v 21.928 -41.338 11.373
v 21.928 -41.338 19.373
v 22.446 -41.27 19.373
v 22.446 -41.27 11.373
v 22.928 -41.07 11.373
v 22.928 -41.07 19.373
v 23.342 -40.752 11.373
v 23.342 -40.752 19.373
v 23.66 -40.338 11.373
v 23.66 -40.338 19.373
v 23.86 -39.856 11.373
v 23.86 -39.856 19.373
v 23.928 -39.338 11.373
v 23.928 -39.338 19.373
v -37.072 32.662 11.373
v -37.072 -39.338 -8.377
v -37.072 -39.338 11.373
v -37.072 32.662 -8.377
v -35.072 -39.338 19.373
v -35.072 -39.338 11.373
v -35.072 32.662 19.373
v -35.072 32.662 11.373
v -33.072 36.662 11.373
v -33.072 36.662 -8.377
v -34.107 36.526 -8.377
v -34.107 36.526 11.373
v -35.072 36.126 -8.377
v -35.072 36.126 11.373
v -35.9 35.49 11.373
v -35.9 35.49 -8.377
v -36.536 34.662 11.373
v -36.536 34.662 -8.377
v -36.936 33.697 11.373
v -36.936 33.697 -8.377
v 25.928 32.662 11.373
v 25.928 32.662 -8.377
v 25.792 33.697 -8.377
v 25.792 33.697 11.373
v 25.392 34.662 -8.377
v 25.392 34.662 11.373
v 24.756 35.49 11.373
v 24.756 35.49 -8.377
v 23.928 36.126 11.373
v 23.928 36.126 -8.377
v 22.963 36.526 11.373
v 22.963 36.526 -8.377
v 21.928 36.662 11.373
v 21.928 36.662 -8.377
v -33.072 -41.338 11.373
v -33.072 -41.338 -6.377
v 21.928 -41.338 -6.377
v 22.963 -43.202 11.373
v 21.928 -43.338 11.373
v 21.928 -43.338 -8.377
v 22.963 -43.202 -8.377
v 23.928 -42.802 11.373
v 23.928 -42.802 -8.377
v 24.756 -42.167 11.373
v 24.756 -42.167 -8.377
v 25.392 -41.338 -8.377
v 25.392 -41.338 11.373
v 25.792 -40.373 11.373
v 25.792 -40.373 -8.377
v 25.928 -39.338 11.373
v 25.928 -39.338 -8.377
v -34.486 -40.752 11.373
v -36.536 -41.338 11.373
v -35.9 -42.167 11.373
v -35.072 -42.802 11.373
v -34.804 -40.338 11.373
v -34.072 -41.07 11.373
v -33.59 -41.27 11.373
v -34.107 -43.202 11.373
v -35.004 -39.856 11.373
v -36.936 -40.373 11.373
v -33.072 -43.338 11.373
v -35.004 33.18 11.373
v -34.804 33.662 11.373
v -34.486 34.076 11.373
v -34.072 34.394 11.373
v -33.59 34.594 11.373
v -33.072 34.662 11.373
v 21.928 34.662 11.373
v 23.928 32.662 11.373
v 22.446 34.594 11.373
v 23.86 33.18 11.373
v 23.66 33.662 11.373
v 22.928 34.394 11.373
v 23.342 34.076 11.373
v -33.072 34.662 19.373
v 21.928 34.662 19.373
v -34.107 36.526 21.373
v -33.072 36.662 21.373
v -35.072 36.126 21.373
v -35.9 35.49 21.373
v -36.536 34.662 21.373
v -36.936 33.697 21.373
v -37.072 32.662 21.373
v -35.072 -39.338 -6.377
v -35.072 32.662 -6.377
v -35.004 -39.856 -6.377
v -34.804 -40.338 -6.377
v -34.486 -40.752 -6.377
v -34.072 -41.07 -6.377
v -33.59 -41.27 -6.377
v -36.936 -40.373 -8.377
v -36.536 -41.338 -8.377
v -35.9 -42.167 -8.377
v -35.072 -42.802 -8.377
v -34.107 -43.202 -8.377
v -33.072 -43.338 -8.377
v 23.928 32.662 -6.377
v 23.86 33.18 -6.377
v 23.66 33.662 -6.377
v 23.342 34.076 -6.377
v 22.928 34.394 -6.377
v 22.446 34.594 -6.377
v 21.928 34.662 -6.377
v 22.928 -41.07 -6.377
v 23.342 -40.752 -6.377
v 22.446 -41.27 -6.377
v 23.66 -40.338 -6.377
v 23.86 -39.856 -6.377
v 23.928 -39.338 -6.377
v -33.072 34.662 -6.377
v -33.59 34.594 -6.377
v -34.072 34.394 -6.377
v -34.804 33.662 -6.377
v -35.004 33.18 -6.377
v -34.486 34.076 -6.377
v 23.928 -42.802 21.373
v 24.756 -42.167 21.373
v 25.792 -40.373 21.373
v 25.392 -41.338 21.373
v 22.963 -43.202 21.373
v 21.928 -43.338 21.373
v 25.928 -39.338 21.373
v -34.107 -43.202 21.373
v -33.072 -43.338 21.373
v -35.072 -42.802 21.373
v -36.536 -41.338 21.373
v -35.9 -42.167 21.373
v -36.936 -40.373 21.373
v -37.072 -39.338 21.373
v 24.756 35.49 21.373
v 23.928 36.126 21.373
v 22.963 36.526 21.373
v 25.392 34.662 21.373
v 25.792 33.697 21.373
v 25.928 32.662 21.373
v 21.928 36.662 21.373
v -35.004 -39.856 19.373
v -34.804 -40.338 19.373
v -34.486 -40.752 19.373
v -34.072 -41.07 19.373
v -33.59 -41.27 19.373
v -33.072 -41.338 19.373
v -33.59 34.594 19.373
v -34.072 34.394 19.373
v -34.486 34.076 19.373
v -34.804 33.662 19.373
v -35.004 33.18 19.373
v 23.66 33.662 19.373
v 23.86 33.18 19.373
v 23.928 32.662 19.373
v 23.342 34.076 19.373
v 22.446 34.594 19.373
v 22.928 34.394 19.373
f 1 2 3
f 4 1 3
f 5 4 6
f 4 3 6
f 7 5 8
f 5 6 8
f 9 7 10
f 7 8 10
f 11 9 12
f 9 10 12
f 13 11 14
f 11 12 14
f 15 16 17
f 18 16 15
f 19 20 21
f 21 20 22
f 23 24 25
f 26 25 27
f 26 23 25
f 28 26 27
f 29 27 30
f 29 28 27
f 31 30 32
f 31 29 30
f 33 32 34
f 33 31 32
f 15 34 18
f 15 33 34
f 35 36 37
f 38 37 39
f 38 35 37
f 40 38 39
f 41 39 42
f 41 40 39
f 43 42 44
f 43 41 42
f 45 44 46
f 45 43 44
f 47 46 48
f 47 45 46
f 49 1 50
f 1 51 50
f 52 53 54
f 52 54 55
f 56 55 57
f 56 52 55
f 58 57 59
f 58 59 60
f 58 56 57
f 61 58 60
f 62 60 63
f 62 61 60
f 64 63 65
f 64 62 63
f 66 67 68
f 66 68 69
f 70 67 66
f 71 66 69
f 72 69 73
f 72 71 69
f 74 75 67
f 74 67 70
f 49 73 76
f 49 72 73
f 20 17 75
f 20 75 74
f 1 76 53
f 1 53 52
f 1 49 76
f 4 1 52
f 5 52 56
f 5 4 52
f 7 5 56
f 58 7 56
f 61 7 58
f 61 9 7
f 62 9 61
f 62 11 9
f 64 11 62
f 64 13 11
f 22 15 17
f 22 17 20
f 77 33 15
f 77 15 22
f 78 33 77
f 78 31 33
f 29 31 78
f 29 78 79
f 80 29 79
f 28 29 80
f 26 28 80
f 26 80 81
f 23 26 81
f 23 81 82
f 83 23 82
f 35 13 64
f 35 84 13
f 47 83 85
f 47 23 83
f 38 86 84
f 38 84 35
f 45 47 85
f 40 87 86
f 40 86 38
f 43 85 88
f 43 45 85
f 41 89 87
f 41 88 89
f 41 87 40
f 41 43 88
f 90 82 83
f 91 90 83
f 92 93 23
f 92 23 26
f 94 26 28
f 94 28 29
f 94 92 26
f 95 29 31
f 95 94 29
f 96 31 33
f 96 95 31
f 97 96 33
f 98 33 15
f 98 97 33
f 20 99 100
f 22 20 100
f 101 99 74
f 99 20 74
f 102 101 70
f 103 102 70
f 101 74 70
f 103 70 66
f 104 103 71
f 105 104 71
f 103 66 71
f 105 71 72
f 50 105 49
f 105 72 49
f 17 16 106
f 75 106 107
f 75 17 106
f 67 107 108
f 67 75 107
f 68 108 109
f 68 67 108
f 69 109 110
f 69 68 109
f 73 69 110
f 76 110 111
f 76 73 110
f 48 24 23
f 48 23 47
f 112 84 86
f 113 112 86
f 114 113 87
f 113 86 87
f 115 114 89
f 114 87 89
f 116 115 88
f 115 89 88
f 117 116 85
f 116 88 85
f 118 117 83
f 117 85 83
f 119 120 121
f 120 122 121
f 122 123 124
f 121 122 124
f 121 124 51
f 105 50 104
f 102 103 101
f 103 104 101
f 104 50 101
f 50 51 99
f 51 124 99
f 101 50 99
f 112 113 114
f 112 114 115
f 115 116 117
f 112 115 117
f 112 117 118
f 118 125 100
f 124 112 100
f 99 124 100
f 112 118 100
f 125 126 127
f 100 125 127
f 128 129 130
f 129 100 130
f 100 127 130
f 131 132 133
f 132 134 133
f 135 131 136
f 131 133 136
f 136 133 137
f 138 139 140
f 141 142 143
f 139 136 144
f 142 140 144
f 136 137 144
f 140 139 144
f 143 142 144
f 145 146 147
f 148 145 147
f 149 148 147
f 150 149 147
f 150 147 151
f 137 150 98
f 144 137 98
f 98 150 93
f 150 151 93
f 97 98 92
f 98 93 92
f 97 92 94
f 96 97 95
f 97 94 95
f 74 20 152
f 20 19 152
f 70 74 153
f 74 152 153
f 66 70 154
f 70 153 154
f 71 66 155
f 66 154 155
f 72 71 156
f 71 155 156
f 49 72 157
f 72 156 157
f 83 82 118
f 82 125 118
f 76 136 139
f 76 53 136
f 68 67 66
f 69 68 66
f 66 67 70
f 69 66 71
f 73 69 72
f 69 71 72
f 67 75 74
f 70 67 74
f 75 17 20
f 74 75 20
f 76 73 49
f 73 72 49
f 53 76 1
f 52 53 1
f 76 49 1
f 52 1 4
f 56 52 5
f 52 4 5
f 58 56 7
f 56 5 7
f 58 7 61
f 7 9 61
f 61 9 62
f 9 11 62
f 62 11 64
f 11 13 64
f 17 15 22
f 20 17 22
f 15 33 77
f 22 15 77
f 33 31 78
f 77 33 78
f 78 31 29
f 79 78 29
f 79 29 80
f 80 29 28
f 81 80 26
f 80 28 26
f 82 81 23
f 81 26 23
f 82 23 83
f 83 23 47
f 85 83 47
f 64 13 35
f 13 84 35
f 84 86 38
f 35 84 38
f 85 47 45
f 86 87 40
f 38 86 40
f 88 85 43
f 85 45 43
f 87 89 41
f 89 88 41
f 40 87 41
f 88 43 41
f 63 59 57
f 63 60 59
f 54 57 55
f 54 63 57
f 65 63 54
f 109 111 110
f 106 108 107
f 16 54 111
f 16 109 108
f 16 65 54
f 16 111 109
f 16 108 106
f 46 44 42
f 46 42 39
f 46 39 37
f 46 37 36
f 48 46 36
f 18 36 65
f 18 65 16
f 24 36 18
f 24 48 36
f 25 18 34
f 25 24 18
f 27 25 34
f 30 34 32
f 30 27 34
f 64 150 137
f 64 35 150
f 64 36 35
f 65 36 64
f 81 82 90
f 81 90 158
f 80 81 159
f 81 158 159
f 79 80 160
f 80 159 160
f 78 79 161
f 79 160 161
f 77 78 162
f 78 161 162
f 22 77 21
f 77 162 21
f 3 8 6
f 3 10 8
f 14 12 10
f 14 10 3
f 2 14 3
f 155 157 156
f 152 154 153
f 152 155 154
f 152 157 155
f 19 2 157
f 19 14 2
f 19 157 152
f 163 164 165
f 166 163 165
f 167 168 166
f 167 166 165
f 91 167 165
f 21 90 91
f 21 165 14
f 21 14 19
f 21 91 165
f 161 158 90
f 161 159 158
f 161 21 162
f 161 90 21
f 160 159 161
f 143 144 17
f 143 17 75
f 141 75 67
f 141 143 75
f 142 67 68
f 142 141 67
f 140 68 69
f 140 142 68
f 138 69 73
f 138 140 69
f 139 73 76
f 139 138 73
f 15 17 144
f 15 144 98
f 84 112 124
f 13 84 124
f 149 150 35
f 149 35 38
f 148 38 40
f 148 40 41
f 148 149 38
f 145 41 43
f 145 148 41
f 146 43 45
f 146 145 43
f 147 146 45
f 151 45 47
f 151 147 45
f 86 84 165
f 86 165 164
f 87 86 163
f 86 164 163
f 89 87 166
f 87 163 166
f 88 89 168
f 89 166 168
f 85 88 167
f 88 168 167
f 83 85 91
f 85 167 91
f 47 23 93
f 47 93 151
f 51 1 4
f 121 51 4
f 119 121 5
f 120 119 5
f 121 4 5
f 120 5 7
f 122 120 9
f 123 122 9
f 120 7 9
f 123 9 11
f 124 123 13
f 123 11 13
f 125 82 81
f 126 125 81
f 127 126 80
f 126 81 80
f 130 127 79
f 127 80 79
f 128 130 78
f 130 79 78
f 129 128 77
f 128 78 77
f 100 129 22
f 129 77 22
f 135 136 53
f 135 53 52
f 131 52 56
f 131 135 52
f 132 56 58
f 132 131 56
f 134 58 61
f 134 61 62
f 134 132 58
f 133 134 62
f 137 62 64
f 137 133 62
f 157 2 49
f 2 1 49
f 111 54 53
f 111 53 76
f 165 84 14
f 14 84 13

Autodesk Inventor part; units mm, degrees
ref_plane "YZ Plane" through (0, 0, 0) normal (1, 0, 0) x (0, 1, 0)
ref_plane "XZ Plane" through (0, 0, 0) normal (0, 1, 0) x (-1, 0, 0)
ref_plane "Work Plane3" through (-33.721, -16.0631, -8.3772) normal (0, 0, -1) x (-1, 0, 0)
sketch "Sketch2" plane through (-33.721, -16.0631, -8.3772) normal (0, 0, -1) x (-1, 0, 0)
  line L0 (3.351, 52.725) -> (-59.649, 52.725)
  line L1 (-59.649, 52.725) -> (-59.649, -27.275)
  line L2 (-59.649, -27.275) -> (3.351, -27.275)
  line L3 (3.351, -27.275) -> (3.351, 52.725)
  line L4 (3.351, 52.725) -> (-59.649, -27.275) construction
  line L5 (-59.649, 52.725) -> (3.351, -27.275) construction
  line L6 (-25.524, -24.775) -> (-3.524, -24.775)
  line L7 (-0.024, 32.975) -> (-0.024, 14.6)
  line L8 (-56.274, -10.275) -> (-56.274, 32.975)
  line L9 (-3.524, 50.225) -> (-25.524, 50.225)
  line L10 (-1.524, 34.475) -> (-56.274, 34.475)
  line L11 (-56.274, -11.775) -> (-56.274, 34.475)
  line L12 (-56.274, -11.775) -> (-1.524, -11.775)
  line L13 (-1.524, -11.775) -> (-1.1358, -11.7239)
  line L14 (-0.774, -11.574) -> (-1.1358, -11.7239)
  line L15 (-0.4633, -11.3357) -> (-0.774, -11.574)
  line L16 (-0.4633, -11.3357) -> (-0.225, -11.025)
  line L17 (-0.0751, -10.6632) -> (-0.225, -11.025)
  line L18 (-0.024, -10.275) -> (-0.0751, -10.6632)
  line L19 (-0.024, 0) -> (-0.024, -10.275)
  line L20 (-0.024, 0) -> (-14.65, 0)
  line L21 (-14.65, 14.6) -> (-14.65, 0)
  line L22 (-0.024, 14.6) -> (-14.65, 14.6)
  line L23 (-0.024, 32.975) -> (-0.024, 14.6)
  line L24 (-0.024, 32.975) -> (-0.0751, 33.3632)
  line L25 (-0.0751, 33.3632) -> (-0.225, 33.725)
  line L26 (-0.225, 33.725) -> (-0.4633, 34.0357)
  line L27 (-0.774, 34.274) -> (-0.4633, 34.0357)
  line L28 (-1.1358, 34.4239) -> (-0.774, 34.274)
  line L29 (-1.1358, 34.4239) -> (-1.524, 34.475)
  line L30 (-46.714, -1.95) -> (-47.364, -1.95)
  line L31 (-46.714, -1.95) -> (-46.714, -2.6)
  line L32 (-47.364, -2.6) -> (-46.714, -2.6)
  line L33 (-47.364, -2.6) -> (-47.364, -1.95)
  line L34 (-37.794, -7.64) -> (-38.444, -7.64)
  line L35 (-37.794, -8.29) -> (-37.794, -7.64)
  line L36 (-38.444, -8.29) -> (-37.794, -8.29)
  line L37 (-38.444, -8.29) -> (-38.444, -7.64)
  line L38 (-2.8885, -10.3772) -> (-3.149, -10.4)
  line L39 (-3.4095, -10.3772) -> (-3.149, -10.4)
  line L40 (-3.662, -10.3095) -> (-3.4095, -10.3772)
  line L41 (-3.899, -10.199) -> (-3.662, -10.3095)
  line L42 (-3.899, -10.199) -> (-4.1132, -10.0491)
  line L43 (-4.1132, -10.0491) -> (-4.2981, -9.8642)
  line L44 (-4.2981, -9.8642) -> (-4.448, -9.65)
  line L45 (-4.5585, -9.413) -> (-4.448, -9.65)
  line L46 (-4.5585, -9.413) -> (-4.6262, -9.1605)
  line L47 (-4.6262, -9.1605) -> (-4.649, -8.9)
  line L48 (-4.649, -8.9) -> (-4.6262, -8.6395)
  line L49 (-4.5585, -8.387) -> (-4.6262, -8.6395)
  line L50 (-4.5585, -8.387) -> (-4.448, -8.15)
  line L51 (-4.448, -8.15) -> (-4.2981, -7.9358)
  line L52 (-4.2981, -7.9358) -> (-4.1132, -7.7509)
  line L53 (-3.899, -7.601) -> (-4.1132, -7.7509)
  line L54 (-3.662, -7.4905) -> (-3.899, -7.601)
  line L55 (-3.662, -7.4905) -> (-3.4095, -7.4228)
  line L56 (-3.4095, -7.4228) -> (-3.149, -7.4)
  line L57 (-2.8885, -7.4228) -> (-3.149, -7.4)
  line L58 (-2.636, -7.4905) -> (-2.8885, -7.4228)
  line L59 (-2.399, -7.601) -> (-2.636, -7.4905)
  line L60 (-2.399, -7.601) -> (-2.1848, -7.7509)
  line L61 (-1.9999, -7.9358) -> (-2.1848, -7.7509)
  line L62 (-1.85, -8.15) -> (-1.9999, -7.9358)
  line L63 (-1.85, -8.15) -> (-1.7395, -8.387)
  line L64 (-1.7395, -8.387) -> (-1.6718, -8.6395)
  line L65 (-1.6718, -8.6395) -> (-1.649, -8.9)
  line L66 (-1.649, -8.9) -> (-1.6718, -9.1605)
  line L67 (-1.7395, -9.413) -> (-1.6718, -9.1605)
  line L68 (-1.7395, -9.413) -> (-1.85, -9.65)
  line L69 (-1.9999, -9.8642) -> (-1.85, -9.65)
  line L70 (-1.9999, -9.8642) -> (-2.1848, -10.0491)
  line L71 (-2.399, -10.199) -> (-2.1848, -10.0491)
  line L72 (-2.636, -10.3095) -> (-2.399, -10.199)
  line L73 (-2.636, -10.3095) -> (-2.8885, -10.3772)
  line L74 (-7.964, -8.29) -> (-7.314, -8.29)
  line L75 (-7.964, -8.29) -> (-7.964, -7.64)
  line L76 (-7.964, -7.64) -> (-7.314, -7.64)
  line L77 (-7.314, -7.64) -> (-7.314, -8.29)
  line L78 (-10.504, -10.83) -> (-9.854, -10.83)
  line L79 (-10.504, -10.18) -> (-10.504, -10.83)
  line L80 (-10.504, -10.18) -> (-9.854, -10.18)
  line L81 (-9.854, -10.18) -> (-9.854, -10.83)
  line L82 (-15.584, -10.83) -> (-14.934, -10.83)
  line L83 (-15.584, -10.18) -> (-15.584, -10.83)
  line L84 (-14.934, -10.18) -> (-15.584, -10.18)
  line L85 (-14.934, -10.18) -> (-14.934, -10.83)
  line L86 (-15.584, -8.29) -> (-14.934, -8.29)
  line L87 (-15.584, -7.64) -> (-15.584, -8.29)
  line L88 (-15.584, -7.64) -> (-14.934, -7.64)
  line L89 (-14.934, -7.64) -> (-14.934, -8.29)
  line L90 (-17.474, -7.64) -> (-17.474, -8.29)
  line L91 (-18.124, -8.29) -> (-17.474, -8.29)
  line L92 (-18.124, -7.64) -> (-18.124, -8.29)
  line L93 (-17.474, -7.64) -> (-18.124, -7.64)
  line L94 (-20.014, -7.64) -> (-20.014, -8.29)
  line L95 (-20.664, -8.29) -> (-20.014, -8.29)
  line L96 (-20.664, -7.64) -> (-20.664, -8.29)
  line L97 (-20.014, -7.64) -> (-20.664, -7.64)
  line L98 (-22.554, -7.64) -> (-22.554, -8.29)
  line L99 (-23.204, -8.29) -> (-22.554, -8.29)
  line L100 (-23.204, -7.64) -> (-23.204, -8.29)
  line L101 (-22.554, -7.64) -> (-23.204, -7.64)
  line L102 (-25.094, -7.64) -> (-25.094, -8.29)
  line L103 (-25.744, -8.29) -> (-25.094, -8.29)
  line L104 (-25.744, -7.64) -> (-25.744, -8.29)
  line L105 (-25.094, -7.64) -> (-25.744, -7.64)
  line L106 (-27.634, -7.64) -> (-27.634, -8.29)
  line L107 (-28.284, -8.29) -> (-27.634, -8.29)
  line L108 (-28.284, -8.29) -> (-28.284, -7.64)
  line L109 (-27.634, -7.64) -> (-28.284, -7.64)
  line L110 (-30.824, -10.83) -> (-30.174, -10.83)
  line L111 (-30.824, -10.18) -> (-30.824, -10.83)
  line L112 (-30.174, -10.18) -> (-30.824, -10.18)
  line L113 (-30.174, -10.18) -> (-30.174, -10.83)
  line L114 (-33.364, -10.83) -> (-32.714, -10.83)
  line L115 (-33.364, -10.18) -> (-33.364, -10.83)
  line L116 (-32.714, -10.18) -> (-33.364, -10.18)
  line L117 (-32.714, -10.18) -> (-32.714, -10.83)
  line L118 (-35.904, -10.83) -> (-35.254, -10.83)
  line L119 (-35.904, -10.18) -> (-35.904, -10.83)
  line L120 (-35.254, -10.18) -> (-35.904, -10.18)
  line L121 (-35.254, -10.18) -> (-35.254, -10.83)
  line L122 (-38.444, -10.83) -> (-37.794, -10.83)
  line L123 (-38.444, -10.18) -> (-38.444, -10.83)
  line L124 (-37.794, -10.18) -> (-38.444, -10.18)
  line L125 (-37.794, -10.18) -> (-37.794, -10.83)
  line L126 (-40.984, -10.83) -> (-40.334, -10.83)
  line L127 (-40.984, -10.18) -> (-40.984, -10.83)
  line L128 (-40.334, -10.18) -> (-40.984, -10.18)
  line L129 (-40.334, -10.18) -> (-40.334, -10.83)
  line L130 (-35.254, -7.64) -> (-35.254, -8.29)
  line L131 (-35.904, -8.29) -> (-35.254, -8.29)
  line L132 (-35.904, -8.29) -> (-35.904, -7.64)
  line L133 (-35.254, -7.64) -> (-35.904, -7.64)
  line L134 (-32.714, -7.64) -> (-32.714, -8.29)
  line L135 (-33.364, -8.29) -> (-32.714, -8.29)
  line L136 (-33.364, -8.29) -> (-33.364, -7.64)
  line L137 (-32.714, -7.64) -> (-33.364, -7.64)
  line L138 (-30.174, -7.64) -> (-30.174, -8.29)
  line L139 (-30.824, -8.29) -> (-30.174, -8.29)
  line L140 (-30.824, -8.29) -> (-30.824, -7.64)
  line L141 (-30.174, -7.64) -> (-30.824, -7.64)
  line L142 (-28.284, -10.83) -> (-27.634, -10.83)
  line L143 (-28.284, -10.18) -> (-28.284, -10.83)
  line L144 (-27.634, -10.18) -> (-28.284, -10.18)
  line L145 (-27.634, -10.18) -> (-27.634, -10.83)
  line L146 (-25.744, -10.83) -> (-25.094, -10.83)
  line L147 (-25.744, -10.18) -> (-25.744, -10.83)
  line L148 (-25.094, -10.18) -> (-25.744, -10.18)
  line L149 (-25.094, -10.18) -> (-25.094, -10.83)
  line L150 (-23.204, -10.83) -> (-22.554, -10.83)
  line L151 (-23.204, -10.18) -> (-23.204, -10.83)
  line L152 (-22.554, -10.18) -> (-23.204, -10.18)
  line L153 (-22.554, -10.18) -> (-22.554, -10.83)
  line L154 (-20.664, -10.83) -> (-20.014, -10.83)
  line L155 (-20.664, -10.18) -> (-20.664, -10.83)
  line L156 (-20.014, -10.18) -> (-20.664, -10.18)
  line L157 (-20.014, -10.18) -> (-20.014, -10.83)
  line L158 (-10.504, -8.29) -> (-9.854, -8.29)
  line L159 (-10.504, -8.29) -> (-10.504, -7.64)
  line L160 (-10.504, -7.64) -> (-9.854, -7.64)
  line L161 (-9.854, -7.64) -> (-9.854, -8.29)
  line L162 (-12.394, -8.29) -> (-12.394, -7.64)
  line L163 (-13.044, -8.29) -> (-12.394, -8.29)
  line L164 (-13.044, -8.29) -> (-13.044, -7.64)
  line L165 (-13.044, -7.64) -> (-12.394, -7.64)
  line L166 (-18.124, -10.83) -> (-17.474, -10.83)
  line L167 (-18.124, -10.18) -> (-18.124, -10.83)
  line L168 (-17.474, -10.18) -> (-18.124, -10.18)
  line L169 (-17.474, -10.18) -> (-17.474, -10.83)
  line L170 (-13.044, -10.83) -> (-12.394, -10.83)
  line L171 (-13.044, -10.18) -> (-13.044, -10.83)
  line L172 (-12.394, -10.18) -> (-13.044, -10.18)
  line L173 (-12.394, -10.18) -> (-12.394, -10.83)
  line L174 (-7.964, -10.83) -> (-7.314, -10.83)
  line L175 (-7.964, -10.18) -> (-7.964, -10.83)
  line L176 (-7.964, -10.18) -> (-7.314, -10.18)
  line L177 (-7.314, -10.18) -> (-7.314, -10.83)
  line L178 (-40.334, -8.29) -> (-40.334, -7.64)
  line L179 (-40.984, -8.29) -> (-40.334, -8.29)
  line L180 (-40.984, -8.29) -> (-40.984, -7.64)
  line L181 (-40.984, -7.64) -> (-40.334, -7.64)
  line L182 (-44.174, -2.6) -> (-44.174, -1.95)
  line L183 (-44.824, -2.6) -> (-44.174, -2.6)
  line L184 (-44.824, -1.95) -> (-44.824, -2.6)
  line L185 (-44.824, -1.95) -> (-44.174, -1.95)
  line L186 (-37.794, 32.88) -> (-37.794, 33.53)
  line L187 (-37.794, 32.88) -> (-38.444, 32.88)
  line L188 (-38.444, 32.88) -> (-38.444, 33.53)
  line L189 (-38.444, 33.53) -> (-37.794, 33.53)
  line L190 (-35.254, 32.88) -> (-35.254, 33.53)
  line L191 (-35.254, 32.88) -> (-35.904, 32.88)
  line L192 (-35.904, 32.88) -> (-35.904, 33.53)
  line L193 (-35.904, 33.53) -> (-35.254, 33.53)
  line L194 (-32.714, 32.88) -> (-32.714, 33.53)
  line L195 (-32.714, 32.88) -> (-33.364, 32.88)
  line L196 (-33.364, 32.88) -> (-33.364, 33.53)
  line L197 (-33.364, 33.53) -> (-32.714, 33.53)
  line L198 (-30.174, 32.88) -> (-30.174, 33.53)
  line L199 (-30.174, 32.88) -> (-30.824, 32.88)
  line L200 (-30.824, 32.88) -> (-30.824, 33.53)
  line L201 (-30.824, 33.53) -> (-30.174, 33.53)
  line L202 (-27.634, 32.88) -> (-27.634, 33.53)
  line L203 (-27.634, 32.88) -> (-28.284, 32.88)
  line L204 (-28.284, 32.88) -> (-28.284, 33.53)
  line L205 (-28.284, 33.53) -> (-27.634, 33.53)
  line L206 (-25.094, 32.88) -> (-25.094, 33.53)
  line L207 (-25.744, 32.88) -> (-25.094, 32.88)
  line L208 (-25.744, 32.88) -> (-25.744, 33.53)
  line L209 (-25.744, 33.53) -> (-25.094, 33.53)
  line L210 (-22.554, 32.88) -> (-22.554, 33.53)
  line L211 (-23.204, 32.88) -> (-22.554, 32.88)
  line L212 (-23.204, 32.88) -> (-23.204, 33.53)
  line L213 (-23.204, 33.53) -> (-22.554, 33.53)
  line L214 (-20.014, 32.88) -> (-20.014, 33.53)
  line L215 (-20.664, 32.88) -> (-20.014, 32.88)
  line L216 (-20.664, 32.88) -> (-20.664, 33.53)
  line L217 (-20.664, 33.53) -> (-20.014, 33.53)
  line L218 (-17.474, 32.88) -> (-17.474, 33.53)
  line L219 (-18.124, 32.88) -> (-17.474, 32.88)
  line L220 (-18.124, 32.88) -> (-18.124, 33.53)
  line L221 (-18.124, 33.53) -> (-17.474, 33.53)
  line L222 (-14.934, 32.88) -> (-14.934, 33.53)
  line L223 (-15.584, 32.88) -> (-14.934, 32.88)
  line L224 (-15.584, 32.88) -> (-15.584, 33.53)
  line L225 (-15.584, 33.53) -> (-14.934, 33.53)
  line L226 (-12.394, 32.88) -> (-12.394, 33.53)
  line L227 (-12.394, 32.88) -> (-13.044, 32.88)
  line L228 (-13.044, 32.88) -> (-13.044, 33.53)
  line L229 (-12.394, 33.53) -> (-13.044, 33.53)
  line L230 (-9.854, 32.88) -> (-9.854, 33.53)
  line L231 (-10.504, 32.88) -> (-9.854, 32.88)
  line L232 (-10.504, 32.88) -> (-10.504, 33.53)
  line L233 (-9.854, 33.53) -> (-10.504, 33.53)
  line L234 (-7.314, 32.88) -> (-7.314, 33.53)
  line L235 (-7.964, 32.88) -> (-7.314, 32.88)
  line L236 (-7.964, 32.88) -> (-7.964, 33.53)
  line L237 (-7.964, 33.53) -> (-7.314, 33.53)
  line L238 (-1.6718, 31.8605) -> (-1.7395, 32.113)
  line L239 (-1.6718, 31.8605) -> (-1.649, 31.6)
  line L240 (-1.649, 31.6) -> (-1.6718, 31.3395)
  line L241 (-1.7395, 31.087) -> (-1.6718, 31.3395)
  line L242 (-1.7395, 31.087) -> (-1.85, 30.85)
  line L243 (-1.85, 30.85) -> (-1.9999, 30.6358)
  line L244 (-2.1848, 30.4509) -> (-1.9999, 30.6358)
  line L245 (-2.1848, 30.4509) -> (-2.399, 30.301)
  line L246 (-2.636, 30.1905) -> (-2.399, 30.301)
  line L247 (-2.8885, 30.1228) -> (-2.636, 30.1905)
  line L248 (-3.149, 30.1) -> (-2.8885, 30.1228)
  line L249 (-3.4095, 30.1228) -> (-3.149, 30.1)
  line L250 (-3.4095, 30.1228) -> (-3.662, 30.1905)
  line L251 (-3.899, 30.301) -> (-3.662, 30.1905)
  line L252 (-4.1132, 30.4509) -> (-3.899, 30.301)
  line L253 (-4.1132, 30.4509) -> (-4.2981, 30.6358)
  line L254 (-4.448, 30.85) -> (-4.2981, 30.6358)
  line L255 (-4.448, 30.85) -> (-4.5585, 31.087)
  line L256 (-4.5585, 31.087) -> (-4.6262, 31.3395)
  line L257 (-4.649, 31.6) -> (-4.6262, 31.3395)
  line L258 (-4.649, 31.6) -> (-4.6262, 31.8605)
  line L259 (-4.6262, 31.8605) -> (-4.5585, 32.113)
  line L260 (-4.5585, 32.113) -> (-4.448, 32.35)
  line L261 (-4.2981, 32.5642) -> (-4.448, 32.35)
  line L262 (-4.2981, 32.5642) -> (-4.1132, 32.7491)
  line L263 (-4.1132, 32.7491) -> (-3.899, 32.899)
  line L264 (-3.662, 33.0095) -> (-3.899, 32.899)
  line L265 (-3.4095, 33.0772) -> (-3.662, 33.0095)
  line L266 (-3.149, 33.1) -> (-3.4095, 33.0772)
  line L267 (-3.149, 33.1) -> (-2.8885, 33.0772)
  line L268 (-2.636, 33.0095) -> (-2.8885, 33.0772)
  line L269 (-2.399, 32.899) -> (-2.636, 33.0095)
  line L270 (-2.1848, 32.7491) -> (-2.399, 32.899)
  line L271 (-2.1848, 32.7491) -> (-1.9999, 32.5642)
  line L272 (-1.9999, 32.5642) -> (-1.85, 32.35)
  line L273 (-1.85, 32.35) -> (-1.7395, 32.113)
  line L274 (-44.399, 30.301) -> (-44.1848, 30.4509)
  line L275 (-44.636, 30.1905) -> (-44.399, 30.301)
  line L276 (-44.636, 30.1905) -> (-44.8885, 30.1228)
  line L277 (-45.149, 30.1) -> (-44.8885, 30.1228)
  line L278 (-45.4095, 30.1228) -> (-45.149, 30.1)
  line L279 (-45.4095, 30.1228) -> (-45.662, 30.1905)
  line L280 (-45.662, 30.1905) -> (-45.899, 30.301)
  line L281 (-45.899, 30.301) -> (-46.1132, 30.4509)
  line L282 (-46.1132, 30.4509) -> (-46.2981, 30.6358)
  line L283 (-46.2981, 30.6358) -> (-46.448, 30.85)
  line L284 (-46.448, 30.85) -> (-46.5585, 31.087)
  line L285 (-46.6262, 31.3395) -> (-46.5585, 31.087)
  line L286 (-46.649, 31.6) -> (-46.6262, 31.3395)
  line L287 (-46.649, 31.6) -> (-46.6262, 31.8605)
  line L288 (-46.6262, 31.8605) -> (-46.5585, 32.113)
  line L289 (-46.5585, 32.113) -> (-46.448, 32.35)
  line L290 (-46.448, 32.35) -> (-46.2981, 32.5642)
  line L291 (-46.1132, 32.7491) -> (-46.2981, 32.5642)
  line L292 (-45.899, 32.899) -> (-46.1132, 32.7491)
  line L293 (-45.899, 32.899) -> (-45.662, 33.0095)
  line L294 (-45.4095, 33.0772) -> (-45.662, 33.0095)
  line L295 (-45.149, 33.1) -> (-45.4095, 33.0772)
  line L296 (-44.8885, 33.0772) -> (-45.149, 33.1)
  line L297 (-44.8885, 33.0772) -> (-44.636, 33.0095)
  line L298 (-44.399, 32.899) -> (-44.636, 33.0095)
  line L299 (-44.399, 32.899) -> (-44.1848, 32.7491)
  line L300 (-43.9999, 32.5642) -> (-44.1848, 32.7491)
  line L301 (-43.9999, 32.5642) -> (-43.85, 32.35)
  line L302 (-43.85, 32.35) -> (-43.7395, 32.113)
  line L303 (-43.7395, 32.113) -> (-43.6718, 31.8605)
  line L304 (-43.6718, 31.8605) -> (-43.649, 31.6)
  line L305 (-43.649, 31.6) -> (-43.6718, 31.3395)
  line L306 (-43.6718, 31.3395) -> (-43.7395, 31.087)
  line L307 (-43.85, 30.85) -> (-43.7395, 31.087)
  line L308 (-43.85, 30.85) -> (-43.9999, 30.6358)
  line L309 (-43.9999, 30.6358) -> (-44.1848, 30.4509)
  line L310 (-40.984, 32.88) -> (-40.984, 33.53)
  line L311 (-40.984, 33.53) -> (-40.334, 33.53)
  line L312 (-40.334, 32.88) -> (-40.334, 33.53)
  line L313 (-40.334, 32.88) -> (-40.984, 32.88)
  line L314 (-41.634, -1.95) -> (-41.634, -2.6)
  line L315 (-41.634, -2.6) -> (-42.284, -2.6)
  line L316 (-42.284, -2.6) -> (-42.284, -1.95)
  line L317 (-41.634, -1.95) -> (-42.284, -1.95)
  line L318 (-43.7395, -8.387) -> (-43.6718, -8.6395)
  line L319 (-43.6718, -8.6395) -> (-43.649, -8.9)
  line L320 (-43.649, -8.9) -> (-43.6718, -9.1605)
  line L321 (-43.6718, -9.1605) -> (-43.7395, -9.413)
  line L322 (-43.85, -9.65) -> (-43.7395, -9.413)
  line L323 (-43.85, -9.65) -> (-43.9999, -9.8642)
  line L324 (-44.1848, -10.0491) -> (-43.9999, -9.8642)
  line L325 (-44.399, -10.199) -> (-44.1848, -10.0491)
  line L326 (-44.636, -10.3095) -> (-44.399, -10.199)
  line L327 (-44.8885, -10.3772) -> (-44.636, -10.3095)
  line L328 (-45.149, -10.4) -> (-44.8885, -10.3772)
  line L329 (-45.4095, -10.3772) -> (-45.149, -10.4)
  line L330 (-45.4095, -10.3772) -> (-45.662, -10.3095)
  line L331 (-45.662, -10.3095) -> (-45.899, -10.199)
  line L332 (-46.1132, -10.0491) -> (-45.899, -10.199)
  line L333 (-46.2981, -9.8642) -> (-46.1132, -10.0491)
  line L334 (-46.2981, -9.8642) -> (-46.448, -9.65)
  line L335 (-46.448, -9.65) -> (-46.5585, -9.413)
  line L336 (-46.6262, -9.1605) -> (-46.5585, -9.413)
  line L337 (-46.649, -8.9) -> (-46.6262, -9.1605)
  line L338 (-46.649, -8.9) -> (-46.6262, -8.6395)
  line L339 (-46.6262, -8.6395) -> (-46.5585, -8.387)
  line L340 (-46.5585, -8.387) -> (-46.448, -8.15)
  line L341 (-46.448, -8.15) -> (-46.2981, -7.9358)
  line L342 (-46.1132, -7.7509) -> (-46.2981, -7.9358)
  line L343 (-45.899, -7.601) -> (-46.1132, -7.7509)
  line L344 (-45.899, -7.601) -> (-45.662, -7.4905)
  line L345 (-45.4095, -7.4228) -> (-45.662, -7.4905)
  line L346 (-45.149, -7.4) -> (-45.4095, -7.4228)
  line L347 (-44.8885, -7.4228) -> (-45.149, -7.4)
  line L348 (-44.8885, -7.4228) -> (-44.636, -7.4905)
  line L349 (-44.399, -7.601) -> (-44.636, -7.4905)
  line L350 (-44.399, -7.601) -> (-44.1848, -7.7509)
  line L351 (-43.9999, -7.9358) -> (-44.1848, -7.7509)
  line L352 (-43.9999, -7.9358) -> (-43.85, -8.15)
  line L353 (-43.85, -8.15) -> (-43.7395, -8.387)
  point P0 (-33.721, 16.0631)
  point P1 (-28.149, 12.725)
  dimension "d2" = 63
  dimension "d3" = 80
  dimension "d4" = 2.5
  dimension "d5" = 3.375
  dimension "d6" = 3.375
  dimension "d7" = 2.5
ref_plane "Work Plane4" through (-28.697, -42.3381, 21.3728) normal (0, 0, 1) x (1, 0, 0)
extrude "Extrusion1" add sketch "Sketch2" against normal up to surface (29.75 mm away) contours L3 L2 L1 L0 | L7 L22 L21 L20 L19 L18 L17 L16 L15 L14 L13 L12 L11 L8 L10 L29 L28 L27 L26 L25 L24 | L31 L32 L33 L30 | L35 L36 L37 L34 | L38 L39 L40 L41 L42 L43 L44 L45 L46 L47 L48 L49 L50 L51 L52 L53 L54 L55 L56 L57 L58 L59 L60 L61 L62 L63 L64 L65 L66 L67 L68 L69 L70 L71 L72 L73 | L75 L76 L77 L74 | L79 L80 L81 L78 | L83 L84 L85 L82 | L87 L88 L89 L86 | L90 L91 L92 L93 | L94 L95 L96 L97 | L98 L99 L100 L101 | L102 L103 L104 L105 | L106 L107 L108 L109 | L111 L112 L113 L110 | L115 L116 L117 L114 | L119 L120 L121 L118 | L123 L124 L125 L122 | L127 L128 L129 L126 | L130 L131 L132 L133 | L134 L135 L136 L137 | L138 L139 L140 L141 | L143 L144 L145 L142 | L147 L148 L149 L146 | L151 L152 L153 L150 | L155 L156 L157 L154 | L159 L160 L161 L158 | L163 L164 L165 L162 | L167 L168 L169 L166 | L171 L172 L173 L170 | L175 L176 L177 L174 | L179 L180 L181 L178 | L183 L184 L185 L182 | L187 L188 L189 L186 | L191 L192 L193 L190 | L195 L196 L197 L194 | L199 L200 L201 L198 | L203 L204 L205 L202 | L207 L208 L209 L206 | L211 L212 L213 L210 | L215 L216 L217 L214 | L219 L220 L221 L218 | L223 L224 L225 L222 | L227 L228 L229 L226 | L231 L232 L233 L230 | L235 L236 L237 L234 | L239 L240 L241 L242 L243 L244 L245 L246 L247 L248 L249 L250 L251 L252 L253 L254 L255 L256 L257 L258 L259 L260 L261 L262 L263 L264 L265 L266 L267 L268 L269 L270 L271 L272 L273 L238 | L275 L276 L277 L278 L279 L280 L281 L282 L283 L284 L285 L286 L287 L288 L289 L290 L291 L292 L293 L294 L295 L296 L297 L298 L299 L300 L301 L302 L303 L304 L305 L306 L307 L308 L309 L274 | L310 L311 L312 L313 | L314 L315 L316 L317 | L318 L319 L320 L321 L322 L323 L324 L325 L326 L327 L328 L329 L330 L331 L332 L333 L334 L335 L336 L337 L338 L339 L340 L341 L342 L343 L344 L345 L346 L347 L348 L349 L350 L351 L352 L353
fillet "Fillet1" radius 4 4 edges at (-37.072, -43.3381, 6.4978) (25.928, -43.3381, 6.4978) (25.928, 36.6619, 6.4978) (-37.072, 36.6619, 6.4978)
shell "Shell1" thickness 2 removed faces 0
ref_plane "Work Plane5" through (-8.197, -40.8381, 11.3728) normal (0, 0, 1) x (1, 0, 0)
split body "Split1" result two bodies by plane through (-8.197, -40.8381, 11.3728) normal (0, 0, 1) first body at (4.928, 8.6619, 20.8728)
equation "\"d6\" = d5"
equation "\"d7\" = d4"
properties part number "bottom"
